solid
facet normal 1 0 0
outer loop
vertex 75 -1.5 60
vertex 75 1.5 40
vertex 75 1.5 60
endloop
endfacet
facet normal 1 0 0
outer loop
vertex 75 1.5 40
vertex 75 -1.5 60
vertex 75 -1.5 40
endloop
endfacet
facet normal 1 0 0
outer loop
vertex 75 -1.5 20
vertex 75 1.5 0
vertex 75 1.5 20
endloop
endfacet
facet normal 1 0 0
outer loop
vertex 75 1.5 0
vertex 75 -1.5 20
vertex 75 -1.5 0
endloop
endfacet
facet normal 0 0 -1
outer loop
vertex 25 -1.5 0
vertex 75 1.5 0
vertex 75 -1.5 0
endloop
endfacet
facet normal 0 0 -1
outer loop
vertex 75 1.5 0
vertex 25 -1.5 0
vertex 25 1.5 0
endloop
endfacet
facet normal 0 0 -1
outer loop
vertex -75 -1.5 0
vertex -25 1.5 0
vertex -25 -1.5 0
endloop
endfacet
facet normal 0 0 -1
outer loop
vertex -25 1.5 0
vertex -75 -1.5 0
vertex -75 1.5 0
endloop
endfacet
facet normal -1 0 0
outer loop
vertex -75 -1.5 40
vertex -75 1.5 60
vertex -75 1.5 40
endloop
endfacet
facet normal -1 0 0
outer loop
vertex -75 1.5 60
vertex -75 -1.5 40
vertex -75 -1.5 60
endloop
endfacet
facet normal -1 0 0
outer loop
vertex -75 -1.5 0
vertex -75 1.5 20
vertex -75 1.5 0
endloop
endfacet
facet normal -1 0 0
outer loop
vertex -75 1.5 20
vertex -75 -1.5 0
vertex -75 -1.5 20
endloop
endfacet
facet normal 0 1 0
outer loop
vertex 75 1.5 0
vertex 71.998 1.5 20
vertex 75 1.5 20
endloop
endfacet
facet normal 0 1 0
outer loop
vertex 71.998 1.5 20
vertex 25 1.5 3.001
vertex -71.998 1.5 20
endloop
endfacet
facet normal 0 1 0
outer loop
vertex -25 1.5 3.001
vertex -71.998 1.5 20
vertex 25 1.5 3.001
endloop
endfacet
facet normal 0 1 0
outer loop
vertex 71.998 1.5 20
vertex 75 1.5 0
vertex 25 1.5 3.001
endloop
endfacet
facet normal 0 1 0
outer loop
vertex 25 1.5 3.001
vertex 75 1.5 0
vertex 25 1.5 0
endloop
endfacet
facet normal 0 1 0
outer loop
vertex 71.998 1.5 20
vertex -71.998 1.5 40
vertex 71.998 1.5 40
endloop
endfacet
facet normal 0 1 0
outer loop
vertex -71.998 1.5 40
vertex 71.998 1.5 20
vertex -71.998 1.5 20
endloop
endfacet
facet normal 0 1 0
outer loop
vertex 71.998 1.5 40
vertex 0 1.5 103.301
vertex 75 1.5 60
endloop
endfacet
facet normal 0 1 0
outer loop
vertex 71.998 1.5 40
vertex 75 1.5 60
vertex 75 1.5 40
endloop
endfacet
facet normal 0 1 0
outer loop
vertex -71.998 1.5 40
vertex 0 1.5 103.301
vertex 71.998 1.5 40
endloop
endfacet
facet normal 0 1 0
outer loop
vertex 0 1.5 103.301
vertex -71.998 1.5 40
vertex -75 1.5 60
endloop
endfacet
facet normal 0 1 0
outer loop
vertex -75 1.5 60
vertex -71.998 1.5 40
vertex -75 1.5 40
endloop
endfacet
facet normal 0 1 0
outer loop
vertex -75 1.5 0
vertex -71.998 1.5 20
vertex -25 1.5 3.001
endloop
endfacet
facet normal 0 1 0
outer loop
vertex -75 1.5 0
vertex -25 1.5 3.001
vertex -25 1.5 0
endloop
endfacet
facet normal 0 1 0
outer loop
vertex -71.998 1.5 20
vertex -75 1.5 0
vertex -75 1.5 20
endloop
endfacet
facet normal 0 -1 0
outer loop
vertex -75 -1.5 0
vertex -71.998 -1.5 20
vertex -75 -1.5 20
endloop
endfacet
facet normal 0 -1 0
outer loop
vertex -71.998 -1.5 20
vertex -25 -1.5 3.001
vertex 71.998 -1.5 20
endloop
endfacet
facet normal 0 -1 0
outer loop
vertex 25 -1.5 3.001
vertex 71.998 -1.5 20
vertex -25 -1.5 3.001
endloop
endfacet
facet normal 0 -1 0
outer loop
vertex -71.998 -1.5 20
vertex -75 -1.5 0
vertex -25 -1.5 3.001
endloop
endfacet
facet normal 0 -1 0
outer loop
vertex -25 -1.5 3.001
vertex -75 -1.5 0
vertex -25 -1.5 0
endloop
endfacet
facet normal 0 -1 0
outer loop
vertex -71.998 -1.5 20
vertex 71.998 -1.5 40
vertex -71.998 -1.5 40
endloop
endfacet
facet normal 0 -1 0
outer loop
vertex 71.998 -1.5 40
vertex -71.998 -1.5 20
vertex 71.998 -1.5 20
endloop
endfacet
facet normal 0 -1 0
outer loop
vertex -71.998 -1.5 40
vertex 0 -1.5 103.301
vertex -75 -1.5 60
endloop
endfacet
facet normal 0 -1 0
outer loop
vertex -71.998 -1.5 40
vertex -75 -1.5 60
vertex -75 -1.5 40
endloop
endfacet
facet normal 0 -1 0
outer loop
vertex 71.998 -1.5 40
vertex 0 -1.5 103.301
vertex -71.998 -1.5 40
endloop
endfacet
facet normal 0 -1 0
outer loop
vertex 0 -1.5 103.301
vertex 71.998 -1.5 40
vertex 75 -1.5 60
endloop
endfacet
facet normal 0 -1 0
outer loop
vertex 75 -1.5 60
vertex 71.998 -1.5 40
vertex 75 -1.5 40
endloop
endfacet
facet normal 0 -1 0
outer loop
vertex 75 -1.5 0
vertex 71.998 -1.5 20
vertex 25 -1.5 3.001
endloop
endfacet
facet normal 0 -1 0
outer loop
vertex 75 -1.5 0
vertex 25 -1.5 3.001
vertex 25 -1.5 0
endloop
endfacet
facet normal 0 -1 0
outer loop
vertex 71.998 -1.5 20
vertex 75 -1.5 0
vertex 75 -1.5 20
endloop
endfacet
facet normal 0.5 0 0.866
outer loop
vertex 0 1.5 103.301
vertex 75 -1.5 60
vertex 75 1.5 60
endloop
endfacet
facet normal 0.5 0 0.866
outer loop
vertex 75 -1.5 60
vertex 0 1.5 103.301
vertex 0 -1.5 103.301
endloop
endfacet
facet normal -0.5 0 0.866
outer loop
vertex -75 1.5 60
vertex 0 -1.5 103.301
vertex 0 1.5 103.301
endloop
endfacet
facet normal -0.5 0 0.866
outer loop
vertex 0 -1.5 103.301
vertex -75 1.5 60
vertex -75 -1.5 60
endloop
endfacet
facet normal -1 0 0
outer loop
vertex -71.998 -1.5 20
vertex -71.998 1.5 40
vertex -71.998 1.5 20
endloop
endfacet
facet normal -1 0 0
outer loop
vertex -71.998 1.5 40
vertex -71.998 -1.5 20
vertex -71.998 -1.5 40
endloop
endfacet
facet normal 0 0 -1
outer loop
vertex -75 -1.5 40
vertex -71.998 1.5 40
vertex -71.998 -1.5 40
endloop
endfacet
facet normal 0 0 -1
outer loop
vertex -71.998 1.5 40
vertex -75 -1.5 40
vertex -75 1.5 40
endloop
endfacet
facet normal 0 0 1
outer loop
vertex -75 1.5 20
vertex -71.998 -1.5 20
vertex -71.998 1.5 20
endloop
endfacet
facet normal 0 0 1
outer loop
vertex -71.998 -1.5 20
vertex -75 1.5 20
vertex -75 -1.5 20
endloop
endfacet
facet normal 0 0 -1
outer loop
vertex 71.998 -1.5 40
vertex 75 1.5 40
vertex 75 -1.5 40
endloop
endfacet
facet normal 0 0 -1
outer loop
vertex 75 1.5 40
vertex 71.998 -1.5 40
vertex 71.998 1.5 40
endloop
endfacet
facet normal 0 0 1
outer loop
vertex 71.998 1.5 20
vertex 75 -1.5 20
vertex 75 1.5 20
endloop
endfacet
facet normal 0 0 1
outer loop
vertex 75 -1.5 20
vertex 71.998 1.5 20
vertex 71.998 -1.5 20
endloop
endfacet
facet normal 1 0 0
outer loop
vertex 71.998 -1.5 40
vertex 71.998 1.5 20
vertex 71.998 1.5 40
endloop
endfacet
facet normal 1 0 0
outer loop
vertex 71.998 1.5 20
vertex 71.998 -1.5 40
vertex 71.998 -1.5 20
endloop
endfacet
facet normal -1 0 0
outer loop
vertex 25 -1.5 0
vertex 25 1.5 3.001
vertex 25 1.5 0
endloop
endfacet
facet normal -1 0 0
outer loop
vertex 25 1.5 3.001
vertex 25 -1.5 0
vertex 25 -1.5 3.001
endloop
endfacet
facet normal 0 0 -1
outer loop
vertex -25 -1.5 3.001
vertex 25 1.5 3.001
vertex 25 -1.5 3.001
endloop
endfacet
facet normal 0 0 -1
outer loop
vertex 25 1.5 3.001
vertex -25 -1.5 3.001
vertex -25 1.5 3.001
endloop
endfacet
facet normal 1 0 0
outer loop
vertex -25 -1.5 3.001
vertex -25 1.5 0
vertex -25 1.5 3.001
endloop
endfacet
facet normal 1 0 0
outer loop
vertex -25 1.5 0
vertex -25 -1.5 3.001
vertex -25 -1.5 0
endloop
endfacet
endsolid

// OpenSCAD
// file: measures.scad
/*
 * All measures of the model
 * Default units: Millimeters
 */

// rendering parameters
$fn = 50;

// material to cut from
material_x = 300;
material_y = 200;
material_z = 3;

// house cuboid
house_x = 150;
house_y = 110;
house_z = 60;

// distances from left and bottom house edges
door_x = 35;
door_z = 35;
door_radius = 35/2;

// how many holes per edge
strap_hole_count = 1;
strap_hole_radius = 3;
strap_hole_spacing = house_y/(strap_hole_count+1);
strap_hole_to_edge = 7;

// angle between upper house cuboid edge and roof plane in degrees
roof_angle = 30;

// elevation inside roof corner above upper edge of house cuboid
roof_elevation = tan(roof_angle) * house_x/2;

// length of a roof plane from top corner to house cuboid corner
roof_hypothenuse = 1/cos(roof_angle) * house_x/2;

// make roof a little longer than required
roof_plane_x = roof_hypothenuse * 1.2;
roof_plane_y = house_y * 1.2;

screw_radius = 4;
screw_length = 20;
washer_radius = 9;
nut_height = 3.2;
nut_wrench_size = 7;
// length between screw head and upper edge of nut
nut_position = 7;
// main file
include <measures.scad>;

module pentagon()
{
    // rectangle
    translate([
        0,
        0,
        house_z/2
        ])
    cube([
        house_x,
        material_z,
        house_z
        ], center=true);

    // triangle
    rotate([
        90,
        0,
        0
        ])
    translate([
        0,
        0,
        -material_z/2
        ])
    linear_extrude(material_z)
    polygon([
        [house_x/2,house_z],
        [0,house_z+roof_elevation],
        [-house_x/2,house_z]
        ]);
}

module face_back()
{
    difference()
    {
        pentagon();

        // bottom nose cutout
        translate([
            0,
            0,
            material_z/2
            ])
        cube([
            house_x/3,
            material_z*1.2,
            material_z*1.001
            ], center=true);

        // side nose cutouts
        for (x=[-house_x/2+material_z/2, +house_x/2-material_z/2])
        {
            translate([
                x,
                0,
                house_z/2
                ])
            cube([
                material_z*1.001,
                material_z*1.001,
                house_z/3
                ], center=true);
        }
    }
}

face_back();
